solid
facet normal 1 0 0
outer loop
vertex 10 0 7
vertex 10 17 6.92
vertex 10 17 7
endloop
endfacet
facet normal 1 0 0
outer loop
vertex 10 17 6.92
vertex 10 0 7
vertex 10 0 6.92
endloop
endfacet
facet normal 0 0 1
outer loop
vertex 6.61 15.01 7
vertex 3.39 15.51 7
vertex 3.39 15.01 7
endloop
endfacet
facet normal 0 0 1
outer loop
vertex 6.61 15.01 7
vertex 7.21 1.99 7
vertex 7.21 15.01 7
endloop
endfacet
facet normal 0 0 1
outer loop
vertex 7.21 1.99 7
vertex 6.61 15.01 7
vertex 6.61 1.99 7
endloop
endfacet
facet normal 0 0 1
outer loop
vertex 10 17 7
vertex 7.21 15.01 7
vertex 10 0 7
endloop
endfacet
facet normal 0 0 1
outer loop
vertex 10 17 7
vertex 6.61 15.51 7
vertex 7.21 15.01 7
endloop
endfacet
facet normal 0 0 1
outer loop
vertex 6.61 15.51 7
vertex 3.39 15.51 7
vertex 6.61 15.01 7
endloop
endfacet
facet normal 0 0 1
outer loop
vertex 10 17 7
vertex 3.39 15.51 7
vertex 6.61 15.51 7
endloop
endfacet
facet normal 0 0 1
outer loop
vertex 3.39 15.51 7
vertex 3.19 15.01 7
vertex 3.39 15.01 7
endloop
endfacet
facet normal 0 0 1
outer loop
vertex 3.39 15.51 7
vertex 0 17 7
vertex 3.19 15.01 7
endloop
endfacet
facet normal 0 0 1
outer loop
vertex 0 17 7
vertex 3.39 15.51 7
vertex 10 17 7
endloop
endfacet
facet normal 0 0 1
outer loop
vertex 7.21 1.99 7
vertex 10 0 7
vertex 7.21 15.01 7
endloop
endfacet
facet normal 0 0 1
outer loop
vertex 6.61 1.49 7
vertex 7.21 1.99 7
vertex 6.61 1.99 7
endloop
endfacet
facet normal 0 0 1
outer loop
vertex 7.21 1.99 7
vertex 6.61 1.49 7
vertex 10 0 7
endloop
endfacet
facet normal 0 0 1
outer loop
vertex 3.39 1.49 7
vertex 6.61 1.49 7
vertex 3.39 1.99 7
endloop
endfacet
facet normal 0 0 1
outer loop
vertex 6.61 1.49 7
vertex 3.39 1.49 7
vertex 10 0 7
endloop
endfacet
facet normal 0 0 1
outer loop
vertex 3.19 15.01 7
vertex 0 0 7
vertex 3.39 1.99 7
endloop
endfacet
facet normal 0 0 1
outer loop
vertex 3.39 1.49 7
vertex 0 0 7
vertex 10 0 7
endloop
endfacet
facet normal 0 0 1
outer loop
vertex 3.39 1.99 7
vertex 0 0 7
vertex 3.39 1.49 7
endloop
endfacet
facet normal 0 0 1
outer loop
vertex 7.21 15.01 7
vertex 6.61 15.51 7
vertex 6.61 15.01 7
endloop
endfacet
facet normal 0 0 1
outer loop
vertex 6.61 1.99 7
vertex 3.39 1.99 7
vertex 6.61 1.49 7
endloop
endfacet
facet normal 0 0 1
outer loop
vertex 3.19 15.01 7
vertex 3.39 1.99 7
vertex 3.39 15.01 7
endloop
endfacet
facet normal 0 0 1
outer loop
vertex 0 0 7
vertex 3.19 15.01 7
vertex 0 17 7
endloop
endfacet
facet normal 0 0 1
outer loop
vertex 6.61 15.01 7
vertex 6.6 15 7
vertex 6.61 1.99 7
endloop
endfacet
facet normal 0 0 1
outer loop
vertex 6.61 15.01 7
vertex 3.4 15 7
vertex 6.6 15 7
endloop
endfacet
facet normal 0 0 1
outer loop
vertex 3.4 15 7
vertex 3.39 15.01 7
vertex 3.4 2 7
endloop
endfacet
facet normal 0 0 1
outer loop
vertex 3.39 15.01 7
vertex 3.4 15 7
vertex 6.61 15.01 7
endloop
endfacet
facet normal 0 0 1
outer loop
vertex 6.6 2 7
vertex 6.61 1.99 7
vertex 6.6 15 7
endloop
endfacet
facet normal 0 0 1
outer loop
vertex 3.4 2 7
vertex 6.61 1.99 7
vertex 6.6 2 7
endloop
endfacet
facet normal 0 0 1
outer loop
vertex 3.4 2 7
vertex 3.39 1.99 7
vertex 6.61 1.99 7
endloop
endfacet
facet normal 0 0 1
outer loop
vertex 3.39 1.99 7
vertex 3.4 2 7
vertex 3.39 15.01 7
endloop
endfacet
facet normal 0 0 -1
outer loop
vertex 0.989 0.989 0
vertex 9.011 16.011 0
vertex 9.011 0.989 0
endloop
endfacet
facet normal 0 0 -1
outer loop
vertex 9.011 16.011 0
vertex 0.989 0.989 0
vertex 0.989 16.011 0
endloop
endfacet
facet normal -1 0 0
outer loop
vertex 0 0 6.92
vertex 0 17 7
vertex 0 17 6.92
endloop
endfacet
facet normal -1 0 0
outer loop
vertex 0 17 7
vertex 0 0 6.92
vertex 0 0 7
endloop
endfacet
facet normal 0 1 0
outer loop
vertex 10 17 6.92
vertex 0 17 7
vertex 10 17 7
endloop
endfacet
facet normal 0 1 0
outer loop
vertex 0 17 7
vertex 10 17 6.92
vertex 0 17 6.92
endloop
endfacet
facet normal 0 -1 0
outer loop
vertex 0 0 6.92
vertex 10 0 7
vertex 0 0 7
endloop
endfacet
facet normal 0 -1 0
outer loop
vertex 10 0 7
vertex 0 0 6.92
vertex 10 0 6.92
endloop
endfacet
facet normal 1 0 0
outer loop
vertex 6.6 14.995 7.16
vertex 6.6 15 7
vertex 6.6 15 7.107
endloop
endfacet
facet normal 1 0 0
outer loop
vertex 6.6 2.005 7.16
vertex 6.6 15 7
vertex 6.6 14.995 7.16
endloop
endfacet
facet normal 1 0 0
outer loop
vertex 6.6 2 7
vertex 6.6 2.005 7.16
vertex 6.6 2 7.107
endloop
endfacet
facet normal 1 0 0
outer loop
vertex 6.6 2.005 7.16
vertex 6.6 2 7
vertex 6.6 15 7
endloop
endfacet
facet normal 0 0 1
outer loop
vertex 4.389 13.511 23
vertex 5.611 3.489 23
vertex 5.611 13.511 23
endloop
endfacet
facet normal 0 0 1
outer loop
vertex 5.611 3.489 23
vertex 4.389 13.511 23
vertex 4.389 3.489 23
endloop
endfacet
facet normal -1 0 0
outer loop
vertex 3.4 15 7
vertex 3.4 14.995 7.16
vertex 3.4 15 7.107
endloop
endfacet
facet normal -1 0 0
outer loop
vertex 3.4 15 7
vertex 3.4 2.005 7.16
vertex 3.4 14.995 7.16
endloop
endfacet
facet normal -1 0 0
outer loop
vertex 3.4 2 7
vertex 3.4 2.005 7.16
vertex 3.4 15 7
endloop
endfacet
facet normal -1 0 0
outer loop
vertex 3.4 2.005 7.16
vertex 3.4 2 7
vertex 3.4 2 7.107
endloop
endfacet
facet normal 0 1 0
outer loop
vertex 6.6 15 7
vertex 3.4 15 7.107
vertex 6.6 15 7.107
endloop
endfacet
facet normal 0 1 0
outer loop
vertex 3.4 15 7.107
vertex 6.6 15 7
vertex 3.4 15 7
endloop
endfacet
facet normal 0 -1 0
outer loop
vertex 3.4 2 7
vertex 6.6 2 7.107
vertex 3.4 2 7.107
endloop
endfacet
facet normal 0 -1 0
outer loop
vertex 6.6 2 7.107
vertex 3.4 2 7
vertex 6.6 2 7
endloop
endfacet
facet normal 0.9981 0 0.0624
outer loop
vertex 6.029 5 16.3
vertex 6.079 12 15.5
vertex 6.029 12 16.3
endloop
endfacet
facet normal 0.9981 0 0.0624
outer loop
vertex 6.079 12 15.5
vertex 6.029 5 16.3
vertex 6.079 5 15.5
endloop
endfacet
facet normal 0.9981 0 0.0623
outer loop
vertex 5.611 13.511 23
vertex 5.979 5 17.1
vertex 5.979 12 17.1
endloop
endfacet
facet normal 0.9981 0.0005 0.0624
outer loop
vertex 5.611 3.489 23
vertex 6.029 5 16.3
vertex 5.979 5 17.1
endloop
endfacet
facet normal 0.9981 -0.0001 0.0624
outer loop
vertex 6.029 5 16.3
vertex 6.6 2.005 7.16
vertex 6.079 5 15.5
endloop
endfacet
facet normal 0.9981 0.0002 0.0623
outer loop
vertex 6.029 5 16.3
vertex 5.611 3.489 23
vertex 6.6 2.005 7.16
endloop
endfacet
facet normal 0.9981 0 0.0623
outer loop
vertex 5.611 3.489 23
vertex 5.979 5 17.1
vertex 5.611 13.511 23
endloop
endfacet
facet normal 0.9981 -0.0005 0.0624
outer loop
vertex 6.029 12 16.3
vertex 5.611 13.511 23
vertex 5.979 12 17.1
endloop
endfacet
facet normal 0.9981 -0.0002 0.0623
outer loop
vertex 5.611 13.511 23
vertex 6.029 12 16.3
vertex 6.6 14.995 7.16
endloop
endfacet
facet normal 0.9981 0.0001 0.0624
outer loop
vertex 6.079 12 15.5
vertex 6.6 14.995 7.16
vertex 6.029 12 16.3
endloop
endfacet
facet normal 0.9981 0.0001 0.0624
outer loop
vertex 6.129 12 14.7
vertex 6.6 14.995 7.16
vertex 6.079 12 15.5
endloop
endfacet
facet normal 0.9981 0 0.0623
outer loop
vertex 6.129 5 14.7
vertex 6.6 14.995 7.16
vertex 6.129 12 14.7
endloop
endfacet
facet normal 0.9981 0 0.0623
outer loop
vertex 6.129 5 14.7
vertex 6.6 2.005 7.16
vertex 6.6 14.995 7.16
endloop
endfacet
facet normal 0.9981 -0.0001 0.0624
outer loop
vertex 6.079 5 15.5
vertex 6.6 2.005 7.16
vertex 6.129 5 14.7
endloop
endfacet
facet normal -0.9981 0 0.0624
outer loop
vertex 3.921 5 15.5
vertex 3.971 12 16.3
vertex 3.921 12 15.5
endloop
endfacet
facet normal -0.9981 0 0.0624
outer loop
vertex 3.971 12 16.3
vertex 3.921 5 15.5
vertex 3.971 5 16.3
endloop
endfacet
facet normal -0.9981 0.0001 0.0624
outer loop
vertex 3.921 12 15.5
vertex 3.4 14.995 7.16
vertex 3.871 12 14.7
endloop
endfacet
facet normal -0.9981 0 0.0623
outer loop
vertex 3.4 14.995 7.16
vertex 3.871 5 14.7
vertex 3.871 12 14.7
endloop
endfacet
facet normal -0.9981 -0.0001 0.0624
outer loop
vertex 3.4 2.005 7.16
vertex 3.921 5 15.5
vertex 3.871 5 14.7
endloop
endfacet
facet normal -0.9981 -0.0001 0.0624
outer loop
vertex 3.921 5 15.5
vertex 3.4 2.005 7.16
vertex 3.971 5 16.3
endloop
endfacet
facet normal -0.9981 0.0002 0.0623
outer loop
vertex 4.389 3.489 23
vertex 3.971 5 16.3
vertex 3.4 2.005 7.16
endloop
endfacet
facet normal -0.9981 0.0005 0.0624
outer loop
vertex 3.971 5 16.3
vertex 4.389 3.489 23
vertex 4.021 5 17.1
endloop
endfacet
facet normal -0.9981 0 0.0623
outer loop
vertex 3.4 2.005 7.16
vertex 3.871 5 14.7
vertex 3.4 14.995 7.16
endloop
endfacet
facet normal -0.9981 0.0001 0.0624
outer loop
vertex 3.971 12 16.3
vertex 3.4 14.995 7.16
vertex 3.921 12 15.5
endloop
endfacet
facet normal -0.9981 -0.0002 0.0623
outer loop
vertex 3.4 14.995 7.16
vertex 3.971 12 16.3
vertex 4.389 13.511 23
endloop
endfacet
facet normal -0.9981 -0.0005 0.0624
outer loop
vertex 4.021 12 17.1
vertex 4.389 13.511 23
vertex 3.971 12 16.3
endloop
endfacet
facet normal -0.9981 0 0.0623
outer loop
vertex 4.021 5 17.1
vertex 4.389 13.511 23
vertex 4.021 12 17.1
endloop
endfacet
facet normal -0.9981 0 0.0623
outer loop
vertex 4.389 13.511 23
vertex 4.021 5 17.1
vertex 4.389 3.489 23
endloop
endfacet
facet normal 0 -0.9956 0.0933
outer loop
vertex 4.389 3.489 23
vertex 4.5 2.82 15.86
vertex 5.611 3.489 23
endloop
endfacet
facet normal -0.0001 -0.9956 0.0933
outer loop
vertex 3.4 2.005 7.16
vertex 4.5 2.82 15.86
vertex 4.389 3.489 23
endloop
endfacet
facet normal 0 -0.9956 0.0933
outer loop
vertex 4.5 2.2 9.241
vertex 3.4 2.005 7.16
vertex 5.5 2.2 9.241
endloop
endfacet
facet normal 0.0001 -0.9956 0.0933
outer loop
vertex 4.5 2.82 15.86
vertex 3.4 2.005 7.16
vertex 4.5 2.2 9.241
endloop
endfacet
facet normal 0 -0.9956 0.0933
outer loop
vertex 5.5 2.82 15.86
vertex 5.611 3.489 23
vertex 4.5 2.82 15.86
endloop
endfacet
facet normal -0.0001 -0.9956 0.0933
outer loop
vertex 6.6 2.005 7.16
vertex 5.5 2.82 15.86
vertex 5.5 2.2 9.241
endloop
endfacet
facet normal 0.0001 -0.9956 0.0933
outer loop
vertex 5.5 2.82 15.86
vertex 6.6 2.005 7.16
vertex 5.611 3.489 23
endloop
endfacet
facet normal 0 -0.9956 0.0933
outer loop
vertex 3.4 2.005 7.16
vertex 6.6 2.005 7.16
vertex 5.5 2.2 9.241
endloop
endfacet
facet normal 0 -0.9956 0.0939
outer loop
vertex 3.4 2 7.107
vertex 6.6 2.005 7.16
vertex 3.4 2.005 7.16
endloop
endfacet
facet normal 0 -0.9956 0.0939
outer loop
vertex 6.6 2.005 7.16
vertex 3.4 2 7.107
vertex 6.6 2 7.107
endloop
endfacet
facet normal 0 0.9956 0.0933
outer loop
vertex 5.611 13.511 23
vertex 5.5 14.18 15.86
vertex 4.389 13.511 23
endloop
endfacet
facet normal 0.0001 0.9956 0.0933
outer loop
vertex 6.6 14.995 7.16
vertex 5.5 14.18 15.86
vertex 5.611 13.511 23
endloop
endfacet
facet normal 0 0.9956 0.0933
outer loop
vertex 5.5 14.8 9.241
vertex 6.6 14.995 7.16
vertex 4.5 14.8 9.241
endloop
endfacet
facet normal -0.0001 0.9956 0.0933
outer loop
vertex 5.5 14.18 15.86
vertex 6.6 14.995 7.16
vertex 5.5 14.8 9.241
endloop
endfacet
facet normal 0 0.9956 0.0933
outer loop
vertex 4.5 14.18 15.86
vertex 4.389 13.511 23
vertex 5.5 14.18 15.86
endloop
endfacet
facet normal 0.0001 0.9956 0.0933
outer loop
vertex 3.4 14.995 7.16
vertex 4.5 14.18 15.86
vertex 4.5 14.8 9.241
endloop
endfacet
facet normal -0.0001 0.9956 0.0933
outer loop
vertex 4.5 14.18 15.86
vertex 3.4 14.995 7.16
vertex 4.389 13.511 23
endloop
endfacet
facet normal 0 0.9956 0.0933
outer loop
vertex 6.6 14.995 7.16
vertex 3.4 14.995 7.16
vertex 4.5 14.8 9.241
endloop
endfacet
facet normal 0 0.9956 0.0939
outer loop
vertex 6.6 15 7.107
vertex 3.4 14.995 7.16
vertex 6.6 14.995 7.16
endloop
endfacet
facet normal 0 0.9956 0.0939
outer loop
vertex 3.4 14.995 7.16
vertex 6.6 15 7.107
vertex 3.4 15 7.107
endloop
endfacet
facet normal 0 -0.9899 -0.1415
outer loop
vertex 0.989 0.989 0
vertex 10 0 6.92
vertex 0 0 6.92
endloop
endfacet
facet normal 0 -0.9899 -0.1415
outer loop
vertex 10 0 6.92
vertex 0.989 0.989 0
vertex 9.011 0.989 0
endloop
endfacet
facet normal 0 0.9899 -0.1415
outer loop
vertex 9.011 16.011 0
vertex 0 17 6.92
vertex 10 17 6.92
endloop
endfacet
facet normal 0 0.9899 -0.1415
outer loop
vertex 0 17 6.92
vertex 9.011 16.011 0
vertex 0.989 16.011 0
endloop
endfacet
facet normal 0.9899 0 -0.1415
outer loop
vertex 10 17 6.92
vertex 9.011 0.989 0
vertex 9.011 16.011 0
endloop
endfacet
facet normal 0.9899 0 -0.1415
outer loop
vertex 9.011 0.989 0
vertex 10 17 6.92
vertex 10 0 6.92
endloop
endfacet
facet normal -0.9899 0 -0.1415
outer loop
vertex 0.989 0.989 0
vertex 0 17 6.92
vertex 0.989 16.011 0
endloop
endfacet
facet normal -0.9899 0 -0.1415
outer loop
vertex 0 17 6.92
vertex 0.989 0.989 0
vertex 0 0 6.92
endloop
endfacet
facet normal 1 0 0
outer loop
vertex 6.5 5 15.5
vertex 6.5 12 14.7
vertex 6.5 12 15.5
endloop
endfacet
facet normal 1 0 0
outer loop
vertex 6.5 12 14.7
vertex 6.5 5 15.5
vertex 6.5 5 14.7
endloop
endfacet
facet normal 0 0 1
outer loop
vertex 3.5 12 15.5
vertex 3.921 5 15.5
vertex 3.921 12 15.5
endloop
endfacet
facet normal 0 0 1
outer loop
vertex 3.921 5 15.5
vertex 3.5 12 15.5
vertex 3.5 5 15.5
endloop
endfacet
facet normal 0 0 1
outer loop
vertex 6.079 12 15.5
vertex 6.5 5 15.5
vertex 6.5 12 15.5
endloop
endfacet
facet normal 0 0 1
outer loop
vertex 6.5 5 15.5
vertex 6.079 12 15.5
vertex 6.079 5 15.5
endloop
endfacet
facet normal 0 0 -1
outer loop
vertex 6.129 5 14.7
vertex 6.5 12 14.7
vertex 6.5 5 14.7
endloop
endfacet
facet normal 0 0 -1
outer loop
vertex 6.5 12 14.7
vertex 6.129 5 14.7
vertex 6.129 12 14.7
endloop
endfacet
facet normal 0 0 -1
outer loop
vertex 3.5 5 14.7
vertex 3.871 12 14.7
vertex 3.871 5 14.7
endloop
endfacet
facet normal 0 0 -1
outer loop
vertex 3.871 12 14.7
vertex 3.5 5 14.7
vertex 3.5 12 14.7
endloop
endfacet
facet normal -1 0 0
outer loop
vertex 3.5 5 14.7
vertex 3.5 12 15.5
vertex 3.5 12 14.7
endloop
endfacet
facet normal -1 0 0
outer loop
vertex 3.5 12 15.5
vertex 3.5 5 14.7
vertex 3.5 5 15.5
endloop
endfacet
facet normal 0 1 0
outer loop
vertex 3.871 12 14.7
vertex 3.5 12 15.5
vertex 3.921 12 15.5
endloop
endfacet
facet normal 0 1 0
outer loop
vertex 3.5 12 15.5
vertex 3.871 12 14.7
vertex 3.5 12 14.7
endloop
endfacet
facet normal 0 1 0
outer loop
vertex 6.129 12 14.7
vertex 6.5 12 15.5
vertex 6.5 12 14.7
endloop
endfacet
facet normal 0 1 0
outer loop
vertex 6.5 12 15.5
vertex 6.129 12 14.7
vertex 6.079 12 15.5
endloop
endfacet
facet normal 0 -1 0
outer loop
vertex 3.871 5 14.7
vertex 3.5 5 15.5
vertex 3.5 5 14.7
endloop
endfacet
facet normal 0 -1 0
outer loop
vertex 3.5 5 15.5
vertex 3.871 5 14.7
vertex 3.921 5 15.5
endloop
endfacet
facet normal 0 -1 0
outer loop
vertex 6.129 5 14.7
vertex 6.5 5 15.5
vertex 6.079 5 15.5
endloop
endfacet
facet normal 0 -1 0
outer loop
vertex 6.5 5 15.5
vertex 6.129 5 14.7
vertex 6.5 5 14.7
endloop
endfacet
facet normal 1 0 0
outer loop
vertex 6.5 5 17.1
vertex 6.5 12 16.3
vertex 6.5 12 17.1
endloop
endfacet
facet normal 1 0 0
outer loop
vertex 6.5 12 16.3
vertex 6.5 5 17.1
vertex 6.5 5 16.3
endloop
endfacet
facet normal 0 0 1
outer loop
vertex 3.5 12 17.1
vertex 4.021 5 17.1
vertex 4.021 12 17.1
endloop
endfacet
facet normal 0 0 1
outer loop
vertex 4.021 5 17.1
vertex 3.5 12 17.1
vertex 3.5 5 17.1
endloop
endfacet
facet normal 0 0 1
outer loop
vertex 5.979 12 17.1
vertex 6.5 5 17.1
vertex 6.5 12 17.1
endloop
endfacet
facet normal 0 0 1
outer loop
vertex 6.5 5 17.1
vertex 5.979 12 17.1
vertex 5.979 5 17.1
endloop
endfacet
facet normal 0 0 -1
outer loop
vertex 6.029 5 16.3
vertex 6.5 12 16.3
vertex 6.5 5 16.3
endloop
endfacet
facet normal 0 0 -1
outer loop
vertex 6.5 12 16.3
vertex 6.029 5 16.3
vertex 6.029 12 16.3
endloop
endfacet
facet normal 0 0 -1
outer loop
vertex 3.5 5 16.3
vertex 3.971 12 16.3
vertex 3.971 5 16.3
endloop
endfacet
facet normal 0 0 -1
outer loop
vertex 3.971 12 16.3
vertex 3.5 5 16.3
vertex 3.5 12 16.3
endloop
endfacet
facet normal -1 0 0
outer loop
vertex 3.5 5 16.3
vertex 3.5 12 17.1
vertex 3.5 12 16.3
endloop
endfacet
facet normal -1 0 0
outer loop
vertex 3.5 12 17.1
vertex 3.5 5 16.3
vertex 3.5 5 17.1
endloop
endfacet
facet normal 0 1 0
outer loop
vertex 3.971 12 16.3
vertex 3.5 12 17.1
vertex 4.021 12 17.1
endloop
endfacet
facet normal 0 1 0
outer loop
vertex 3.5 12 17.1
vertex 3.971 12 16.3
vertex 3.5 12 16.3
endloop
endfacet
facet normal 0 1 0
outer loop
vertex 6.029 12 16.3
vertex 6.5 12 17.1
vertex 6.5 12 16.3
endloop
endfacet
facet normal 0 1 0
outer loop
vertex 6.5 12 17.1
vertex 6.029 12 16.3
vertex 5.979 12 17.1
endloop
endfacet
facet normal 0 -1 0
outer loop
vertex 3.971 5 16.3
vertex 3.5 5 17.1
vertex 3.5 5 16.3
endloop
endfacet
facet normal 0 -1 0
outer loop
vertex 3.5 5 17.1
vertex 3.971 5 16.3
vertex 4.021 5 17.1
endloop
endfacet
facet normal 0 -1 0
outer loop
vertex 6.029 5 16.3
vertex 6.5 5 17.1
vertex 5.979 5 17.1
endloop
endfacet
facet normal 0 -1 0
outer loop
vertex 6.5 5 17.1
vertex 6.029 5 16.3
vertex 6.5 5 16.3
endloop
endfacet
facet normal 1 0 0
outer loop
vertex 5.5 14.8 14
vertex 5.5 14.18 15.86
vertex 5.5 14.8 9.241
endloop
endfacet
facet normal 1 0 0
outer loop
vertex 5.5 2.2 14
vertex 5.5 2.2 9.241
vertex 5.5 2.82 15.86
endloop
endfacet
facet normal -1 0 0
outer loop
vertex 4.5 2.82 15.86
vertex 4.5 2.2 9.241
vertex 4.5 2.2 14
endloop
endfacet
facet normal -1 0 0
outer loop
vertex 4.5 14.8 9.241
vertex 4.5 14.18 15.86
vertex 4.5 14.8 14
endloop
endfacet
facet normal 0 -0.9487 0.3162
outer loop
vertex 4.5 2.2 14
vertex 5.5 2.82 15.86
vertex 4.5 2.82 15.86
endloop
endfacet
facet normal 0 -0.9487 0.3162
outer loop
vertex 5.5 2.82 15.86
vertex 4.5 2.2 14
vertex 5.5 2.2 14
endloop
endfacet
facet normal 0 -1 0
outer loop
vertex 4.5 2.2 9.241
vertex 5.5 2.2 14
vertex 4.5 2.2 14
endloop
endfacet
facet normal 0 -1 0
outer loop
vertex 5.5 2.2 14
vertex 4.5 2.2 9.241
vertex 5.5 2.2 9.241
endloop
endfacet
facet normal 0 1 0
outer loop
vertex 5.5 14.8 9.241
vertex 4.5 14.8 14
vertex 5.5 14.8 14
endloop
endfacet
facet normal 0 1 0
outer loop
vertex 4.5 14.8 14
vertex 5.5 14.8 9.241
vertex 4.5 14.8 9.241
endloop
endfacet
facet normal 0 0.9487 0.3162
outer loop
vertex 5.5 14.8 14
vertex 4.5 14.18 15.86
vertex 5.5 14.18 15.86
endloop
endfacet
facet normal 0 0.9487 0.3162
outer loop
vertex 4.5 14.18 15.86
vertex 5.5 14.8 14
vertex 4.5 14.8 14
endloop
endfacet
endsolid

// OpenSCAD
difference(){union(){
cube([10,17,7]);
translate([3.4,2,7]) cube([3.2,13,16]);
}
  translate([6.61,1.49,7]) mirror([1,0,0]) rotate([180,270,90]) linear_extrude(14.02) polygon([[0,0],[16.01,0],[16.01,1]]);
  translate([3.39,1.49,7]) mirror([0,0,0]) rotate([180,270,90]) linear_extrude(14.02) polygon([[0,0],[16.01,0],[16.01,1]]);
  translate([3.19,1.99,7]) mirror([0,1]) rotate([0,270,180]) linear_extrude(4.02) polygon([[0,0],[16.01,0],[16.01,1.5]]);
  translate([3.19,15.01,7]) rotate([0,270,180]) linear_extrude(4.02) polygon([[0,0],[16.01,0],[16.01,1.5]]);
  translate([-.01,-.01,-.01]) rotate([0,0,90]) rotate([90,0]) linear_extrude(10.02) polygon([[1,0],[0,7],[0,0]]);
  translate([-.01,17.01,-.01]) mirror([0,1]) rotate([90,0,90]) linear_extrude(10.02) polygon([[1,0],[0,7],[0,0]]);
  translate([10.01,-.01,-.01]) rotate([0,0,0]) rotate([270,180]) linear_extrude(17.02) polygon([[1,0],[0,7],[0,0]]);
  translate([-.01,-.01,-.01]) mirror([1,0]) rotate([0,0,0]) rotate([270,180]) linear_extrude(17.02) polygon([[1,0],[0,7],[0,0]]);

}
translate([3.5,5,14.7]) cube([3,7,.8]);
translate([3.5,5,16.3]) cube([3,7,.8]);
translate([4.5,2.2,8]) rotate([90,0,90]) linear_extrude(1) polygon([[0,0],[0,6],[3,15],[9.6,15],[12.6,6],[12.6,0]]);
